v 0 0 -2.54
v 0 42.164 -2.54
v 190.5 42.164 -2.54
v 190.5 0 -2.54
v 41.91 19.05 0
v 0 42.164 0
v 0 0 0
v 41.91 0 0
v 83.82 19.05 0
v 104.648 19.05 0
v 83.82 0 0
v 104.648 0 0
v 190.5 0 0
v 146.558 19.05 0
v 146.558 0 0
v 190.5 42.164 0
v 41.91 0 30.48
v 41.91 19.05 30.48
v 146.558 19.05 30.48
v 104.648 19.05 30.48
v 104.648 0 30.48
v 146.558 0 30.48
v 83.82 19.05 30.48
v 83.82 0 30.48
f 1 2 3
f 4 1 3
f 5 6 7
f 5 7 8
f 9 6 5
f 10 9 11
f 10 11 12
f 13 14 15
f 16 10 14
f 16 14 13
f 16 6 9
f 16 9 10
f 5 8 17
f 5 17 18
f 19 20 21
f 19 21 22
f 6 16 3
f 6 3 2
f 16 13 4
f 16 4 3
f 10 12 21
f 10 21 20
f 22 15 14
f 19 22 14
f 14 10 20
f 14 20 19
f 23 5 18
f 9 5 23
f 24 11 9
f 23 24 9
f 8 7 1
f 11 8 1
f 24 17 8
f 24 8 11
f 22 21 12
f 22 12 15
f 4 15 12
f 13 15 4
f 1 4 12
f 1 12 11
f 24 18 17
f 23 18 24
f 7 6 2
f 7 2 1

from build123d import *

# Parameters (mm, degrees)
SKETCH1_W           = 190.5
SKETCH1_H           = 42.164
BOSS_EXTRUDE1_DEPTH = 2.54
SKETCH1_3_W         = 41.91
SKETCH1_3_H         = 19.05
BOSS_EXTRUDE2_DEPTH = 30.48


with BuildPart() as part:
    # Sketch1 → Boss-Extrude1 (new body)
    with BuildSketch(Plane.XY):
        with Locations((95.25, 21.082)):
            Rectangle(SKETCH1_W, SKETCH1_H)
    extrude(amount=-BOSS_EXTRUDE1_DEPTH)

    # Sketch1<3> → Boss-Extrude2 (add)
    with BuildSketch(Plane.XY):
        with Locations((62.865, 9.525)):
            Rectangle(SKETCH1_3_W, SKETCH1_3_H)
        with Locations((125.603, 9.525)):
            Rectangle(SKETCH1_3_W, SKETCH1_3_H)
    extrude(amount=BOSS_EXTRUDE2_DEPTH)


solid = part.part
